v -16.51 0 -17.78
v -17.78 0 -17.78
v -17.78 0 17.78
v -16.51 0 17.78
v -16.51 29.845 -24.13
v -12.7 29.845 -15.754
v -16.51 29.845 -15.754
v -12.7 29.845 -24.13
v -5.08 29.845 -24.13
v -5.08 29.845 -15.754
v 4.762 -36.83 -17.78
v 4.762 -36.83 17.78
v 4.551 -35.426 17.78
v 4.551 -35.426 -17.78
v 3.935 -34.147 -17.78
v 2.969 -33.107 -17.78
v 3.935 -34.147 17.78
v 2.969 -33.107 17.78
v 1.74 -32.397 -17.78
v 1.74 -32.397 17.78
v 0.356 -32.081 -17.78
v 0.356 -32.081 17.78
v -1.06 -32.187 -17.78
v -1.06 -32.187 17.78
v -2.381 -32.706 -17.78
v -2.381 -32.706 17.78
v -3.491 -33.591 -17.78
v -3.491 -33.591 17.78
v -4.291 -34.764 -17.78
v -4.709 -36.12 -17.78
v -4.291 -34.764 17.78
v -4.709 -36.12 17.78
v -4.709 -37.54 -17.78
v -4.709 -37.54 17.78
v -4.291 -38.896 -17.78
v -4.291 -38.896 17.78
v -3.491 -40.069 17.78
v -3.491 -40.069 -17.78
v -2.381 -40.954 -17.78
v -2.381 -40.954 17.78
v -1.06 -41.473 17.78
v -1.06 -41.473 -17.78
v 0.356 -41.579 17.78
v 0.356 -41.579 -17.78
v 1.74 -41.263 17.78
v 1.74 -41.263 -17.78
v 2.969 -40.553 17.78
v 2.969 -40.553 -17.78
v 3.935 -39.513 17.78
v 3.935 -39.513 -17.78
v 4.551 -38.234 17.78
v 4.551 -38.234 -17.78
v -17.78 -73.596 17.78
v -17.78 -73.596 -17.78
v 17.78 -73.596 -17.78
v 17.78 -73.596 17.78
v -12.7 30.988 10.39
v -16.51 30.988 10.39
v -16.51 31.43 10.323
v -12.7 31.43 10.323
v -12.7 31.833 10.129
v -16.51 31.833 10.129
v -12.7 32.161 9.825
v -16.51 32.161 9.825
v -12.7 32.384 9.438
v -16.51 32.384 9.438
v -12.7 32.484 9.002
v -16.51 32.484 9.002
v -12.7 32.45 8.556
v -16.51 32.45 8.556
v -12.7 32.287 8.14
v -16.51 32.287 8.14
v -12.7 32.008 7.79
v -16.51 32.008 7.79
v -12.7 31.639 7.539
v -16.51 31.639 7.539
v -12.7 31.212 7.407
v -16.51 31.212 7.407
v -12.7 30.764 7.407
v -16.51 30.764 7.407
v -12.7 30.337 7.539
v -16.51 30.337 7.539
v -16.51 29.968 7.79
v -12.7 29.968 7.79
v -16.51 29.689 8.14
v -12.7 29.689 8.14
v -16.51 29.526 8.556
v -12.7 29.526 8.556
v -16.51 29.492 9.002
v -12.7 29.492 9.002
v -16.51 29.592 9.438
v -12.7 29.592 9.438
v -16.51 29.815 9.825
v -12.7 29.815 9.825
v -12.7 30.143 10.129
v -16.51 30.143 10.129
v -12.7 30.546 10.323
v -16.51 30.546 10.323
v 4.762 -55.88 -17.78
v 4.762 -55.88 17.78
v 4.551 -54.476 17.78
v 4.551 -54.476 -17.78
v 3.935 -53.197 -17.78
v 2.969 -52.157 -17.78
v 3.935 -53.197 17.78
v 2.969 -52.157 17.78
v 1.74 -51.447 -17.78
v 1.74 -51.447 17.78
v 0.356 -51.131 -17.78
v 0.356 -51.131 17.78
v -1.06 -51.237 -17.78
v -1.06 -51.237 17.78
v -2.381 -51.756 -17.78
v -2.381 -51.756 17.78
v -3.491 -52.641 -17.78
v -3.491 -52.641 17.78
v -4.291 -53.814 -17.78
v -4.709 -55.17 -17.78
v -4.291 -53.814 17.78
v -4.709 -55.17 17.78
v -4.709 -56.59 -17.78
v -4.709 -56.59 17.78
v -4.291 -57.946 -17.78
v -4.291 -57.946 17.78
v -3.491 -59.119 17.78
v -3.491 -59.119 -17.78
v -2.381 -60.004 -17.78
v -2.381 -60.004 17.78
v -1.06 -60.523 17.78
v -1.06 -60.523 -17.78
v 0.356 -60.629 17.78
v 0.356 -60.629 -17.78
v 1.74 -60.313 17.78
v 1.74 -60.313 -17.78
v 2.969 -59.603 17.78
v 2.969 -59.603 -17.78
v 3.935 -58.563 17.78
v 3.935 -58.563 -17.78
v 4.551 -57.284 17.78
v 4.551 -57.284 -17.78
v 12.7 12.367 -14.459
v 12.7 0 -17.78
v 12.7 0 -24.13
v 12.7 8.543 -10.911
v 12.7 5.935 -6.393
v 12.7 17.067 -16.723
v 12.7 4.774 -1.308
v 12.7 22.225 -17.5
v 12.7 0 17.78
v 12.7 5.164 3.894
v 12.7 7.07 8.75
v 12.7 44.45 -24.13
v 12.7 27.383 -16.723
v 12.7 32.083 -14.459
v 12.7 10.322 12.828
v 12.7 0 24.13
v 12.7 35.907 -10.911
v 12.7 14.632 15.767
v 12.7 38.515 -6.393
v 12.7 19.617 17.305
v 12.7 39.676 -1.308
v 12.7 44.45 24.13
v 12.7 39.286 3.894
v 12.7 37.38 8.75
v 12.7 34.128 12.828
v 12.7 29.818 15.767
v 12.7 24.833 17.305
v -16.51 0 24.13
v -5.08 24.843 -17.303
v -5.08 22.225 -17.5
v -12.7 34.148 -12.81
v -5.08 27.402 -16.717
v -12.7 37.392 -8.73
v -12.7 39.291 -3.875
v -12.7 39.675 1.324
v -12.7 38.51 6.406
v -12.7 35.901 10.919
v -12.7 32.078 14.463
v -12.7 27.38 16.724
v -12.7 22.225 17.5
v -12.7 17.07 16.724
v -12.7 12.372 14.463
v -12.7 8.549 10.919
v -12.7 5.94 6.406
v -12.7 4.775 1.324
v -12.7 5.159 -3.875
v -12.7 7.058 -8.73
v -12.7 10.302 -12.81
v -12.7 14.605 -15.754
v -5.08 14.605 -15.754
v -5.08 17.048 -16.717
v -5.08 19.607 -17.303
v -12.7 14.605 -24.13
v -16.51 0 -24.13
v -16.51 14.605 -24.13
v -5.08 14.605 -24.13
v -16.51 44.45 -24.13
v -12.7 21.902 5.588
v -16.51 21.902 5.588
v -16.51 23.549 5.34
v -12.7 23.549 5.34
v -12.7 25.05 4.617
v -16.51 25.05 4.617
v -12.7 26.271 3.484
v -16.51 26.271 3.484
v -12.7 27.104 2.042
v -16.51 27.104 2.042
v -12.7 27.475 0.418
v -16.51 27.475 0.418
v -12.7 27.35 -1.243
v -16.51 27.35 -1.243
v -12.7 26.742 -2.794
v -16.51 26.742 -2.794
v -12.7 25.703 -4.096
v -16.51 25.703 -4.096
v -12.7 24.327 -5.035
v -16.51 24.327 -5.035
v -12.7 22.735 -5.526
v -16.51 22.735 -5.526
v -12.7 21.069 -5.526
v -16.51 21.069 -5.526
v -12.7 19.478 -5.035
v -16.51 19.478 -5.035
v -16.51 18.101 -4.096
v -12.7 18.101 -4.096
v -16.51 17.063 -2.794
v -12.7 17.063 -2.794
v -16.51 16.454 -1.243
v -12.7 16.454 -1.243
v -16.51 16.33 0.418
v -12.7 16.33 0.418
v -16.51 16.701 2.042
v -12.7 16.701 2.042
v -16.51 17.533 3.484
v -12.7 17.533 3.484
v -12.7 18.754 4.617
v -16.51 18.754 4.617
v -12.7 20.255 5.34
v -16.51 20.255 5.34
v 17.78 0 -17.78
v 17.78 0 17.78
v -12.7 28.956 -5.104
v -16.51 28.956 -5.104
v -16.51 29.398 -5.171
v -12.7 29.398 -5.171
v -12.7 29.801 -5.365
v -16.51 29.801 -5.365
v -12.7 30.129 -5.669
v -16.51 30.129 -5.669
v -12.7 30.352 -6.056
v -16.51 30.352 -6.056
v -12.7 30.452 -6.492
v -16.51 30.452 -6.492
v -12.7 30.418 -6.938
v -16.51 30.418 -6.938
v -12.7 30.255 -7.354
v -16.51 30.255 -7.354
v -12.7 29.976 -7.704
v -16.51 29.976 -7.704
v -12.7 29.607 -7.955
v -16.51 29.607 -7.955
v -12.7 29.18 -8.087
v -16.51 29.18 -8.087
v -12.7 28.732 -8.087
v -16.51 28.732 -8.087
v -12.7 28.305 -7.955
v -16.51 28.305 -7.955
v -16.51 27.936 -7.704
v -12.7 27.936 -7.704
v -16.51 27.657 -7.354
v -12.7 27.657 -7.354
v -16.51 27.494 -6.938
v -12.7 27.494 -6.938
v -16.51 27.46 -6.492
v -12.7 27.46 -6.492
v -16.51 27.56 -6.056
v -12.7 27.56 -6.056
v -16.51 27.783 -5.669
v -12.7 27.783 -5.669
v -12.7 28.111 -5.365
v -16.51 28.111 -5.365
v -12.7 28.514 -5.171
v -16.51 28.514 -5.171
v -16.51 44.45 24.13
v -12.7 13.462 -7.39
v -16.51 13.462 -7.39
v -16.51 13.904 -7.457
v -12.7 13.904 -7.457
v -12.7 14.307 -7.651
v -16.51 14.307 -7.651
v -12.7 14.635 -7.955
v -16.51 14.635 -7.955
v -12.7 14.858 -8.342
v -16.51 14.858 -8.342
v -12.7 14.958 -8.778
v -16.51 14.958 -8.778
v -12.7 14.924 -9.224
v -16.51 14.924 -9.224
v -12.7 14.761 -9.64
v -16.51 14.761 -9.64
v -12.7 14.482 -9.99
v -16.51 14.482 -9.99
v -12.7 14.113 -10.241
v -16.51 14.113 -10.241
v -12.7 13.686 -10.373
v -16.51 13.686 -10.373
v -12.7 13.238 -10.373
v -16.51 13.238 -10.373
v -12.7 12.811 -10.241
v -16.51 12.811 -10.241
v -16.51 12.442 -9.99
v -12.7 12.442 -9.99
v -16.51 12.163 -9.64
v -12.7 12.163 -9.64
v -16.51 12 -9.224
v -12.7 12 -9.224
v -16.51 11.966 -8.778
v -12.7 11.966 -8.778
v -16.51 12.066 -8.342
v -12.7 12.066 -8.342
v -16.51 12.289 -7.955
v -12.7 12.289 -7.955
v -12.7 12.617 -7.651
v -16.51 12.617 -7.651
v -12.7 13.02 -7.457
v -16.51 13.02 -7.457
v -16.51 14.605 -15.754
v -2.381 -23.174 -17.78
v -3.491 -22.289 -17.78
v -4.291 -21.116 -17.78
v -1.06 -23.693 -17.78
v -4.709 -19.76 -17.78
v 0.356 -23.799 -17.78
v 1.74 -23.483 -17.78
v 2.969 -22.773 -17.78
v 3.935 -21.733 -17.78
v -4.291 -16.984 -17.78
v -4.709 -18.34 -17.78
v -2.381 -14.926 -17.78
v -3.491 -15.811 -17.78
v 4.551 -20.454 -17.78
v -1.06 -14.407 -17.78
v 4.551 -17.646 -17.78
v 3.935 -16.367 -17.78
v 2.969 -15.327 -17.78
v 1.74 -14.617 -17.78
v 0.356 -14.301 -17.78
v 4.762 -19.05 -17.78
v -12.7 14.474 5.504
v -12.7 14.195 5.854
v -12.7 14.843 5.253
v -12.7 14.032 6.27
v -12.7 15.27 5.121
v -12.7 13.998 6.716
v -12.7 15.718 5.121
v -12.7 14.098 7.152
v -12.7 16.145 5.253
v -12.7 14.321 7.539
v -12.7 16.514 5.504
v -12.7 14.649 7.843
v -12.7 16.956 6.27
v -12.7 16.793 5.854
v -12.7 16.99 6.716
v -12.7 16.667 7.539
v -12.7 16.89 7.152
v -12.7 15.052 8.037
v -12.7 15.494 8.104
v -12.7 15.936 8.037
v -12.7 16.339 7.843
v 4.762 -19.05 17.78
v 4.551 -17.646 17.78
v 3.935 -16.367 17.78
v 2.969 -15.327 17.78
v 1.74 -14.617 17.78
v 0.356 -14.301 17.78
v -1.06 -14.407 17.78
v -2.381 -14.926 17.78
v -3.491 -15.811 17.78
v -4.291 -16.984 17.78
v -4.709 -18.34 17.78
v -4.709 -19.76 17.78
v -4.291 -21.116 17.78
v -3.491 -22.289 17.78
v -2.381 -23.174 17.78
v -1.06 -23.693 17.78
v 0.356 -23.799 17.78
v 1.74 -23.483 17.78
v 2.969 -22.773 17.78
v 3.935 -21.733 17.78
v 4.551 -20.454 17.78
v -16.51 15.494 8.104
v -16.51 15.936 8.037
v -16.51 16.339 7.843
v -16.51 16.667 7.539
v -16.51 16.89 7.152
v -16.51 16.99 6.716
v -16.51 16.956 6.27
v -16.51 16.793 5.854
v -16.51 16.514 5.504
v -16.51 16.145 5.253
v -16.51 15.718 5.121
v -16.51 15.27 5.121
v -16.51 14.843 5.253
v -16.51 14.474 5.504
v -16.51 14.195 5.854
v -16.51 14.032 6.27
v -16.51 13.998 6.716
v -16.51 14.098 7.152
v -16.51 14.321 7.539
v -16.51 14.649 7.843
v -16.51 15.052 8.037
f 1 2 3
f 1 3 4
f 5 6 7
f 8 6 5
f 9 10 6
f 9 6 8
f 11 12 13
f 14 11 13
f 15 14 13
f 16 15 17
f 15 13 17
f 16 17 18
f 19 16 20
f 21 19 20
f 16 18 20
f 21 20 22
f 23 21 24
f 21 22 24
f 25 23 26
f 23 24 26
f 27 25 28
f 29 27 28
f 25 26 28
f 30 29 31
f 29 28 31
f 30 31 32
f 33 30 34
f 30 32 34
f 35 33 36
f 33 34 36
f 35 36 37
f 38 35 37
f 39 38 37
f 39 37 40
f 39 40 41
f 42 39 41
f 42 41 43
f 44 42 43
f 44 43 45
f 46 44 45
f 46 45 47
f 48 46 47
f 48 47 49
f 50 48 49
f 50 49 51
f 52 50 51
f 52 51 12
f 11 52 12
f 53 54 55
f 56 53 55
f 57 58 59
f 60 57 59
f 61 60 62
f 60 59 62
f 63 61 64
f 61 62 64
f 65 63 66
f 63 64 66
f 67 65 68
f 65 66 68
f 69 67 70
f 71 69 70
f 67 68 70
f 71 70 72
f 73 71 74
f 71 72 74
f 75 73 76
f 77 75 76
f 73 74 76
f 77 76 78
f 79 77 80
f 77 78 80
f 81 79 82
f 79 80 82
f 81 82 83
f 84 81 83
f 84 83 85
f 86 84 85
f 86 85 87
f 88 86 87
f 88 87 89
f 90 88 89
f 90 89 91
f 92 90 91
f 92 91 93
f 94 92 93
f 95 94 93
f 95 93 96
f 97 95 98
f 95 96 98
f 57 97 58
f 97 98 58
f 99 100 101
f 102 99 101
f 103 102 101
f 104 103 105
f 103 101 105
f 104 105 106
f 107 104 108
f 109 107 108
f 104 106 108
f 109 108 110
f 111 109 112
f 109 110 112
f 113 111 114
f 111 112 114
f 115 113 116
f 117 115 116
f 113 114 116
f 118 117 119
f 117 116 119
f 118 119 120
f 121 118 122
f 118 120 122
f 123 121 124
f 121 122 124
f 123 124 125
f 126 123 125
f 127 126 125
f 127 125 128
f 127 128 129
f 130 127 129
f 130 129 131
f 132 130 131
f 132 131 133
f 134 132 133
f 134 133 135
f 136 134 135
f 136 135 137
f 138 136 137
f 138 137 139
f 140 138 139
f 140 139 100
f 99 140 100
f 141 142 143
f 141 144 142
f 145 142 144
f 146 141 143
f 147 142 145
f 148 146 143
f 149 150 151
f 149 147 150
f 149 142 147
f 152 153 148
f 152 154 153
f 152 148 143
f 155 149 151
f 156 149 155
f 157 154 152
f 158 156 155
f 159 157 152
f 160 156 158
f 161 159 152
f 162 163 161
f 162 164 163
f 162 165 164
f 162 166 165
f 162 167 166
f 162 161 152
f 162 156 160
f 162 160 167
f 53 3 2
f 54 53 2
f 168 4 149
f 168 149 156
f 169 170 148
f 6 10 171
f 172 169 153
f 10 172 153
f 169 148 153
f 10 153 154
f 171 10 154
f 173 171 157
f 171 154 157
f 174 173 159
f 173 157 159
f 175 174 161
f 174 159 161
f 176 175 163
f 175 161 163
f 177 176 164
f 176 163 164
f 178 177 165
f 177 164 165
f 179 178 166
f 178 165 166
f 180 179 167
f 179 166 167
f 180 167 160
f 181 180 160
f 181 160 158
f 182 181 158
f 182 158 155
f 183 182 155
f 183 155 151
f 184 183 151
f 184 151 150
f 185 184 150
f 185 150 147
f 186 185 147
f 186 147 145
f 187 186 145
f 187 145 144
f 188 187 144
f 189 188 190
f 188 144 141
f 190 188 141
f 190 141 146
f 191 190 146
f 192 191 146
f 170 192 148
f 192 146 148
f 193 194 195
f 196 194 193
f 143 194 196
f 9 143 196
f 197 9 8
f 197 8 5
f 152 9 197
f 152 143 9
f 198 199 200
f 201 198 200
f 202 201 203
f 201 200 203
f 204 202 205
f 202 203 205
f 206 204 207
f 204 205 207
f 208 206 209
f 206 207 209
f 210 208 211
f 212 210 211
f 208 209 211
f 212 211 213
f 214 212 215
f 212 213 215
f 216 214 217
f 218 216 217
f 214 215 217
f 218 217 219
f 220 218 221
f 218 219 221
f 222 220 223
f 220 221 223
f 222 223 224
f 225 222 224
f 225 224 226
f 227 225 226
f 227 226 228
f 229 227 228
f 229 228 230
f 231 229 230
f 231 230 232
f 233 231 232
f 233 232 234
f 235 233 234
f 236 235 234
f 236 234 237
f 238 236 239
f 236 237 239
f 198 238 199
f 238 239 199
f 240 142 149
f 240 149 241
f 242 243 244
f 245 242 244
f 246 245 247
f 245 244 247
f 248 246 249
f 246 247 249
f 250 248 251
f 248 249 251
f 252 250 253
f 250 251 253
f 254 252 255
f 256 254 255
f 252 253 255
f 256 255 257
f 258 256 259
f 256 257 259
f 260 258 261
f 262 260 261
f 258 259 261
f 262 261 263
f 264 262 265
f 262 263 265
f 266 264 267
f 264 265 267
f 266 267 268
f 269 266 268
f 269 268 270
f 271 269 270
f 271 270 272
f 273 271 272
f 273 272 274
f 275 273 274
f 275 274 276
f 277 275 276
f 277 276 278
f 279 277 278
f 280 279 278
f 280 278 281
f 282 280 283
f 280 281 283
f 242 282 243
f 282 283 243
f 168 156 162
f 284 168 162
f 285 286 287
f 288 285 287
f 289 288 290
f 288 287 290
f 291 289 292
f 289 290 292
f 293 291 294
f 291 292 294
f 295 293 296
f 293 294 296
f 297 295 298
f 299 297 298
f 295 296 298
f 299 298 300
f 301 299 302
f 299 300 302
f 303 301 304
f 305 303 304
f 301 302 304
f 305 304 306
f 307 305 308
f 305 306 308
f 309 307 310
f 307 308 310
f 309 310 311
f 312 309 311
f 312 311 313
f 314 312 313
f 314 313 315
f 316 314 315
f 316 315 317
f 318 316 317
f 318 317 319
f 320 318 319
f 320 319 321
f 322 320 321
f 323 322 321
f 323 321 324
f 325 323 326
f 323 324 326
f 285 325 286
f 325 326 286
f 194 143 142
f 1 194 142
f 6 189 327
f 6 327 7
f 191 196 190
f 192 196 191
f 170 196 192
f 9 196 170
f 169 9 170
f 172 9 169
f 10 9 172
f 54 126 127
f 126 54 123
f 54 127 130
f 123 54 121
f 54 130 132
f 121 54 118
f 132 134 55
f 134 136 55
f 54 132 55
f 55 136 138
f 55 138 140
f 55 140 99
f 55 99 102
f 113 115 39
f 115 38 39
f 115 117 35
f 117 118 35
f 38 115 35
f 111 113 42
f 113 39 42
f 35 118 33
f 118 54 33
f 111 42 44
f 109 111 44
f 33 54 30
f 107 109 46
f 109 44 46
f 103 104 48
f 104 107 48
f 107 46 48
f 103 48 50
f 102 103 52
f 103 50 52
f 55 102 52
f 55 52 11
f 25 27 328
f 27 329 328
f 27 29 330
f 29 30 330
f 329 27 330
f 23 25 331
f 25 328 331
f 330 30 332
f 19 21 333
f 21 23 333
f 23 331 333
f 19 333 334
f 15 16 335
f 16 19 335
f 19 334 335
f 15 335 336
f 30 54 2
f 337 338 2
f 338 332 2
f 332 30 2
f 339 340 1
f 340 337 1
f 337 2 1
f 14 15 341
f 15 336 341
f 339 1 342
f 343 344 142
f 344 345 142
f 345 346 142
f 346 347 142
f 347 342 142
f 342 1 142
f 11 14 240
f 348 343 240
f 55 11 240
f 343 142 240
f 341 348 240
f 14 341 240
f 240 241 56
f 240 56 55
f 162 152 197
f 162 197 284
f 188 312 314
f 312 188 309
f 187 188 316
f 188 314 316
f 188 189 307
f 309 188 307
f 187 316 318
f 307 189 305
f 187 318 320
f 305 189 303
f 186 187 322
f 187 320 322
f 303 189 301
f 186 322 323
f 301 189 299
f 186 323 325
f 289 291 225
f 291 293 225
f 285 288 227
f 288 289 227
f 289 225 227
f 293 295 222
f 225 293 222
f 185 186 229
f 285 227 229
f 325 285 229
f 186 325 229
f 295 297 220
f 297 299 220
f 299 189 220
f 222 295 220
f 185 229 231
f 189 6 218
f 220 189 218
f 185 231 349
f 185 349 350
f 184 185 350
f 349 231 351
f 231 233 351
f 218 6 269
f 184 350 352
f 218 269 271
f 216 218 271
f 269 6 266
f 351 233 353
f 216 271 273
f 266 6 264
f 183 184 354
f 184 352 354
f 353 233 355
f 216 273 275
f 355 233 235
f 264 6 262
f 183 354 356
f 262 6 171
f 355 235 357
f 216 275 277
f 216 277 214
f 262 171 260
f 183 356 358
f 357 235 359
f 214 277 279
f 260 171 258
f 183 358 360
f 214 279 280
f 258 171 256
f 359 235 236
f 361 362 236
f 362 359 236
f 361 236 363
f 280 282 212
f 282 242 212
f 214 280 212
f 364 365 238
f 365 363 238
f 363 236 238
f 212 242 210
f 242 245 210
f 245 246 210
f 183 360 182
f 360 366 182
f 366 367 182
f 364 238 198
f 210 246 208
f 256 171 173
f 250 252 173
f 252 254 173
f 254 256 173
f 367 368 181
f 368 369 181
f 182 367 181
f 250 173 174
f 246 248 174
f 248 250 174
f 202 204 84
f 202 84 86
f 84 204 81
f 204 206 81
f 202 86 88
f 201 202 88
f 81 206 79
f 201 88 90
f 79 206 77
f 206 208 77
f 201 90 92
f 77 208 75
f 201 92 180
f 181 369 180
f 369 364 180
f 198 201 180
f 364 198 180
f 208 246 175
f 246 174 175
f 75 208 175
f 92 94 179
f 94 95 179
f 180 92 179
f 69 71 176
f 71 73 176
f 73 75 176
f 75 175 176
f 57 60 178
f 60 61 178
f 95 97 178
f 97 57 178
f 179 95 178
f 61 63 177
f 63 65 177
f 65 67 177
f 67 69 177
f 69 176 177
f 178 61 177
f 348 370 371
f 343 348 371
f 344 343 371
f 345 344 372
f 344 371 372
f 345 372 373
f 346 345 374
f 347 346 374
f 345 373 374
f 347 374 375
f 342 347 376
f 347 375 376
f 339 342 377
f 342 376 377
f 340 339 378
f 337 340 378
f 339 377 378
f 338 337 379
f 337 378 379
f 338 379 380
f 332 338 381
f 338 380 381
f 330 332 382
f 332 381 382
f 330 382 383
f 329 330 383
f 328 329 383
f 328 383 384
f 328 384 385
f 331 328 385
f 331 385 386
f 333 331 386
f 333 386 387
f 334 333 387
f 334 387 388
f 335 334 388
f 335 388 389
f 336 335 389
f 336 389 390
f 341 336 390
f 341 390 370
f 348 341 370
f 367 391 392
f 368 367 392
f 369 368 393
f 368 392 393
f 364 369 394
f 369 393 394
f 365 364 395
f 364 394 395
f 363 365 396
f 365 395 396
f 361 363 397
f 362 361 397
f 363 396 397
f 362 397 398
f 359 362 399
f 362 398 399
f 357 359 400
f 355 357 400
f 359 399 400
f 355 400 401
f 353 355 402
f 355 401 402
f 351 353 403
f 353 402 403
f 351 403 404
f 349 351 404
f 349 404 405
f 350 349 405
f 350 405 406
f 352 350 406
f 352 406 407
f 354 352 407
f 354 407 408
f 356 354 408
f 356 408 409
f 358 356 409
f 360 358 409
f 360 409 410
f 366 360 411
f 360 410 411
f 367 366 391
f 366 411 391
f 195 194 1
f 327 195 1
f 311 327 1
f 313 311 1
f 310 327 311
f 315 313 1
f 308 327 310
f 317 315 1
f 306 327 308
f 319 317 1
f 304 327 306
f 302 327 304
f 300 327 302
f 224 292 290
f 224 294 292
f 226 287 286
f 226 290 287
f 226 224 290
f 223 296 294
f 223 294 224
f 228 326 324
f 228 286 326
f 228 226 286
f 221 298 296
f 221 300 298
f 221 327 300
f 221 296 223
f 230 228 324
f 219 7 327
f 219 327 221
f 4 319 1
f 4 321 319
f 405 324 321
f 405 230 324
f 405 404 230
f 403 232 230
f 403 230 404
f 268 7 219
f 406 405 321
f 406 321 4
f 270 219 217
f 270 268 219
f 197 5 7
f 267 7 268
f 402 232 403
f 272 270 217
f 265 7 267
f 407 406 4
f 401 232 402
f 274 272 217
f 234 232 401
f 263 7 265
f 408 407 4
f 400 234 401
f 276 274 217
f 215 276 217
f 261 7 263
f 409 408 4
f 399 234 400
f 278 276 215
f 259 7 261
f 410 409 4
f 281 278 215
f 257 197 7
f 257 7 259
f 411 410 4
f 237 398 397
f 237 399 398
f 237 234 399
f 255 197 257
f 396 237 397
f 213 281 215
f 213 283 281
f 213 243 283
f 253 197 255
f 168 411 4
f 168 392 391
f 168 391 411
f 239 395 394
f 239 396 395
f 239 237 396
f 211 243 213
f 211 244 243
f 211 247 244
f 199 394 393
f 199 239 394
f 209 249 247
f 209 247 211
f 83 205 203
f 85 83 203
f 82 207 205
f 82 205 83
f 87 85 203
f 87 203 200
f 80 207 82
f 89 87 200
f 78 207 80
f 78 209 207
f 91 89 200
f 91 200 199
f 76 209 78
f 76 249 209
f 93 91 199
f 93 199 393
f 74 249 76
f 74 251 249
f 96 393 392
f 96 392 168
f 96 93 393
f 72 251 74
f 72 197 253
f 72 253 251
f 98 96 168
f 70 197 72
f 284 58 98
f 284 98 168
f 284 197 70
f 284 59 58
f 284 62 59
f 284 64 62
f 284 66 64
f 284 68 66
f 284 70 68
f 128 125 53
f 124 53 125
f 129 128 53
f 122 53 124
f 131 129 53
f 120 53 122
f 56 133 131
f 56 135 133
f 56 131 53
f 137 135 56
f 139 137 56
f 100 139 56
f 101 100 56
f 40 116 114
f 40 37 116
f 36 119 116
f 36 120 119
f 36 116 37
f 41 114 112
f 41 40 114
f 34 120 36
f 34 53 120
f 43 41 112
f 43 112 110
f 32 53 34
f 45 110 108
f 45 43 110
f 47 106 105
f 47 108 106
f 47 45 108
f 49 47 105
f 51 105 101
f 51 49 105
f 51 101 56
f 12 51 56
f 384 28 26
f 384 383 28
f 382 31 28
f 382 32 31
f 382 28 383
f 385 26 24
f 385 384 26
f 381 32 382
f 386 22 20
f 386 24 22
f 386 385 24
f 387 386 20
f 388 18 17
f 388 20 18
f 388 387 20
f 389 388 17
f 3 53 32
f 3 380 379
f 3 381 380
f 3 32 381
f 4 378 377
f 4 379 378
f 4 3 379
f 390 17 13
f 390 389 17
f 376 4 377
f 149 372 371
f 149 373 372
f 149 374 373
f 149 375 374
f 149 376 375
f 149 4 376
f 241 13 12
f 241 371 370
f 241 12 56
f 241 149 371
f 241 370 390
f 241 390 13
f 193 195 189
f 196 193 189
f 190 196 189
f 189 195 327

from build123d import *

# Parameters (mm, degrees)
SKETCH1_W           = 35.56
SKETCH1_H           = 35.56
BOSS_EXTRUDE1_DEPTH = 73.5965
SKETCH2_R           = 4.7625
CUT_EXTRUDE1_DEPTH  = 84.648591215
SKETCH3_W           = 25.4
SKETCH3_H           = 35.56
BOSS_EXTRUDE2_DEPTH = 44.45
SKETCH5_W           = 25.4
SKETCH5_H           = 44.45
BOSS_EXTRUDE3_DEPTH = 6.35
SKETCH6_W           = 25.4
SKETCH6_H           = 44.45
BOSS_EXTRUDE4_DEPTH = 6.35
SKETCH4_R           = 17.500000052
CUT_EXTRUDE2_DEPTH  = 84.232998938
SKETCH8_W           = 11.185009969
SKETCH8_H           = 15.24
CUT_EXTRUDE3_DEPTH  = 7.62
SKETCH9_W           = 48.26
SKETCH9_H           = 44.45
BOSS_EXTRUDE6_DEPTH = 3.81
SKETCH12_W          = 8.37609249
SKETCH12_H          = 15.24
CUT_EXTRUDE5_DEPTH  = 3.81
SKETCH13_R          = 5.588
CUT_EXTRUDE6_DEPTH  = 3.81
SKETCH14_R          = 1.5
CUT_EXTRUDE7_DEPTH  = 3.81


with BuildPart() as part:
    # Sketch1 → Boss-Extrude1 (new body)
    with BuildSketch(Plane(origin=(0, 0, 0), x_dir=(1, 0, 0), z_dir=(0, 1, 0))):
        Rectangle(SKETCH1_W, SKETCH1_H)
    extrude(amount=-BOSS_EXTRUDE1_DEPTH)

    # Sketch2 → Cut-Extrude1 (cut, through all)
    with BuildSketch(Plane.XY.offset(17.78)):
        with Locations((0, -19.05)):
            Circle(SKETCH2_R)
        with Locations((0, -36.83)):
            Circle(SKETCH2_R)
        with Locations((0, -55.88)):
            Circle(SKETCH2_R)
    extrude(amount=-CUT_EXTRUDE1_DEPTH, mode=Mode.SUBTRACT)

    # Sketch3 → Boss-Extrude2 (add)
    with BuildSketch(Plane(origin=(0, 0, 0), x_dir=(1, 0, 0), z_dir=(0, 1, 0))):
        Rectangle(SKETCH3_W, SKETCH3_H)
    extrude(amount=BOSS_EXTRUDE2_DEPTH)

    # Sketch5 → Boss-Extrude3 (add)
    with BuildSketch(Plane.XY.offset(17.78)):
        with Locations((0, 22.225)):
            Rectangle(SKETCH5_W, SKETCH5_H)
    extrude(amount=BOSS_EXTRUDE3_DEPTH)

    # Sketch6 → Boss-Extrude4 (add)
    with BuildSketch(Plane(origin=(0, 0, -17.78), x_dir=(-1, 0, 0), z_dir=(0, 0, -1))):
        with Locations((0, 22.225)):
            Rectangle(SKETCH6_W, SKETCH6_H)
    extrude(amount=BOSS_EXTRUDE4_DEPTH)

    # Sketch4 → Cut-Extrude2 (cut, through all)
    with BuildSketch(Plane(origin=(12.7, 0, 0), x_dir=(0, 0, -1), z_dir=(1, 0, 0))):
        with Locations((0, 22.225)):
            Circle(SKETCH4_R)
    extrude(amount=-CUT_EXTRUDE2_DEPTH, mode=Mode.SUBTRACT)

    # Sketch8 → Cut-Extrude3 (cut)
    with BuildSketch(Plane.ZY.offset(12.7)):
        with Locations((-18.537495016, 22.225)):
            Rectangle(SKETCH8_W, SKETCH8_H)
    extrude(amount=-CUT_EXTRUDE3_DEPTH, mode=Mode.SUBTRACT)

    # Sketch9 → Boss-Extrude6 (add)
    with BuildSketch(Plane.ZY.offset(12.7)):
        with Locations((0, 22.225)):
            Rectangle(SKETCH9_W, SKETCH9_H)
    extrude(amount=BOSS_EXTRUDE6_DEPTH)

    # Sketch12 → Cut-Extrude5 (cut)
    with BuildSketch(Plane(origin=(-12.7, 0, 0), x_dir=(0, 0, -1), z_dir=(1, 0, 0))):
        with Locations((19.941953755, 22.225)):
            Rectangle(SKETCH12_W, SKETCH12_H)
    extrude(amount=-CUT_EXTRUDE5_DEPTH, mode=Mode.SUBTRACT)

    # Sketch13 → Cut-Extrude6 (cut)
    with BuildSketch(Plane.ZY.offset(16.51)):
        with Locations((0, 21.902286104)):
            Circle(SKETCH13_R)
    extrude(amount=-CUT_EXTRUDE6_DEPTH, mode=Mode.SUBTRACT)

    # Sketch14 → Cut-Extrude7 (cut)
    with BuildSketch(Plane.ZY.offset(16.51)):
        with Locations((-6.604, 28.956)):
            Circle(SKETCH14_R)
        with Locations((-8.89, 13.462)):
            Circle(SKETCH14_R)
        with Locations((8.89, 30.988)):
            Circle(SKETCH14_R)
        with Locations((6.604, 15.494)):
            Circle(SKETCH14_R)
    extrude(amount=-CUT_EXTRUDE7_DEPTH, mode=Mode.SUBTRACT)


solid = part.part
